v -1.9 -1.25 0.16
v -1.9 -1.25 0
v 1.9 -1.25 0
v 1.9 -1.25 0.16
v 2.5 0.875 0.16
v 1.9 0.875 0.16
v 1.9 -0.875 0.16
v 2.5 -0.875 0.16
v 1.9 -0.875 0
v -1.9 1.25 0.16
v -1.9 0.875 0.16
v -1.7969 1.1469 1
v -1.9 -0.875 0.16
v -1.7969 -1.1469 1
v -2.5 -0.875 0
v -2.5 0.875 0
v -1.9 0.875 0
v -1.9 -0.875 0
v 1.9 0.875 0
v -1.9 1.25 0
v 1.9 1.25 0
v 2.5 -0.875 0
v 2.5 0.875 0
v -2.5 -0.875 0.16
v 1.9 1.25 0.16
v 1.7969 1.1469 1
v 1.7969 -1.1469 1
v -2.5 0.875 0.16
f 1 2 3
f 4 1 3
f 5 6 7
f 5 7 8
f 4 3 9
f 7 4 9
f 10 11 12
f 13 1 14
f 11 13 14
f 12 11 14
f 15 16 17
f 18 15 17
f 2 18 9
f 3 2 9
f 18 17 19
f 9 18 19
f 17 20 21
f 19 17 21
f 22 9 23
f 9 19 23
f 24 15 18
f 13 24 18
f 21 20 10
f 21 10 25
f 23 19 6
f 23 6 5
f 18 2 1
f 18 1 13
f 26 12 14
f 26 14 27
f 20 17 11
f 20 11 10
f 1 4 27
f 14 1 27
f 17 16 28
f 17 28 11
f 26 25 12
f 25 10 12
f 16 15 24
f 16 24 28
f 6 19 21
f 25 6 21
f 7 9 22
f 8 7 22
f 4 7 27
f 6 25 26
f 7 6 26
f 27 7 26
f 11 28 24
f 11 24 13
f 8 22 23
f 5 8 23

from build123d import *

# Parameters (mm, degrees)
ESQUISSE1_W     = 3.8
ESQUISSE1_H     = 2.5
CASE_BASE_DEPTH = 0.16
ESQUISSE2_W     = 3.8
ESQUISSE2_H     = 2.5
CASE_TOP_DEPTH  = 0.84
CASE_TOP_TAPER  = 7
ESQUISSE3_W     = 5
ESQUISSE3_H     = 1.75
PINS_DEPTH      = 0.16


with BuildPart() as part:
    # Esquisse1 → case base (new body)
    with BuildSketch(Plane.XY):
        Rectangle(ESQUISSE1_W, ESQUISSE1_H)
    extrude(amount=CASE_BASE_DEPTH)

    # Esquisse2 → case top (add)
    with BuildSketch(Plane.XY.offset(0.16)):
        Rectangle(ESQUISSE2_W, ESQUISSE2_H)
    extrude(amount=CASE_TOP_DEPTH, taper=CASE_TOP_TAPER)

    # Esquisse3 → pins (add)
    with BuildSketch(Plane.XY):
        Rectangle(ESQUISSE3_W, ESQUISSE3_H)
    extrude(amount=PINS_DEPTH)


solid = part.part
